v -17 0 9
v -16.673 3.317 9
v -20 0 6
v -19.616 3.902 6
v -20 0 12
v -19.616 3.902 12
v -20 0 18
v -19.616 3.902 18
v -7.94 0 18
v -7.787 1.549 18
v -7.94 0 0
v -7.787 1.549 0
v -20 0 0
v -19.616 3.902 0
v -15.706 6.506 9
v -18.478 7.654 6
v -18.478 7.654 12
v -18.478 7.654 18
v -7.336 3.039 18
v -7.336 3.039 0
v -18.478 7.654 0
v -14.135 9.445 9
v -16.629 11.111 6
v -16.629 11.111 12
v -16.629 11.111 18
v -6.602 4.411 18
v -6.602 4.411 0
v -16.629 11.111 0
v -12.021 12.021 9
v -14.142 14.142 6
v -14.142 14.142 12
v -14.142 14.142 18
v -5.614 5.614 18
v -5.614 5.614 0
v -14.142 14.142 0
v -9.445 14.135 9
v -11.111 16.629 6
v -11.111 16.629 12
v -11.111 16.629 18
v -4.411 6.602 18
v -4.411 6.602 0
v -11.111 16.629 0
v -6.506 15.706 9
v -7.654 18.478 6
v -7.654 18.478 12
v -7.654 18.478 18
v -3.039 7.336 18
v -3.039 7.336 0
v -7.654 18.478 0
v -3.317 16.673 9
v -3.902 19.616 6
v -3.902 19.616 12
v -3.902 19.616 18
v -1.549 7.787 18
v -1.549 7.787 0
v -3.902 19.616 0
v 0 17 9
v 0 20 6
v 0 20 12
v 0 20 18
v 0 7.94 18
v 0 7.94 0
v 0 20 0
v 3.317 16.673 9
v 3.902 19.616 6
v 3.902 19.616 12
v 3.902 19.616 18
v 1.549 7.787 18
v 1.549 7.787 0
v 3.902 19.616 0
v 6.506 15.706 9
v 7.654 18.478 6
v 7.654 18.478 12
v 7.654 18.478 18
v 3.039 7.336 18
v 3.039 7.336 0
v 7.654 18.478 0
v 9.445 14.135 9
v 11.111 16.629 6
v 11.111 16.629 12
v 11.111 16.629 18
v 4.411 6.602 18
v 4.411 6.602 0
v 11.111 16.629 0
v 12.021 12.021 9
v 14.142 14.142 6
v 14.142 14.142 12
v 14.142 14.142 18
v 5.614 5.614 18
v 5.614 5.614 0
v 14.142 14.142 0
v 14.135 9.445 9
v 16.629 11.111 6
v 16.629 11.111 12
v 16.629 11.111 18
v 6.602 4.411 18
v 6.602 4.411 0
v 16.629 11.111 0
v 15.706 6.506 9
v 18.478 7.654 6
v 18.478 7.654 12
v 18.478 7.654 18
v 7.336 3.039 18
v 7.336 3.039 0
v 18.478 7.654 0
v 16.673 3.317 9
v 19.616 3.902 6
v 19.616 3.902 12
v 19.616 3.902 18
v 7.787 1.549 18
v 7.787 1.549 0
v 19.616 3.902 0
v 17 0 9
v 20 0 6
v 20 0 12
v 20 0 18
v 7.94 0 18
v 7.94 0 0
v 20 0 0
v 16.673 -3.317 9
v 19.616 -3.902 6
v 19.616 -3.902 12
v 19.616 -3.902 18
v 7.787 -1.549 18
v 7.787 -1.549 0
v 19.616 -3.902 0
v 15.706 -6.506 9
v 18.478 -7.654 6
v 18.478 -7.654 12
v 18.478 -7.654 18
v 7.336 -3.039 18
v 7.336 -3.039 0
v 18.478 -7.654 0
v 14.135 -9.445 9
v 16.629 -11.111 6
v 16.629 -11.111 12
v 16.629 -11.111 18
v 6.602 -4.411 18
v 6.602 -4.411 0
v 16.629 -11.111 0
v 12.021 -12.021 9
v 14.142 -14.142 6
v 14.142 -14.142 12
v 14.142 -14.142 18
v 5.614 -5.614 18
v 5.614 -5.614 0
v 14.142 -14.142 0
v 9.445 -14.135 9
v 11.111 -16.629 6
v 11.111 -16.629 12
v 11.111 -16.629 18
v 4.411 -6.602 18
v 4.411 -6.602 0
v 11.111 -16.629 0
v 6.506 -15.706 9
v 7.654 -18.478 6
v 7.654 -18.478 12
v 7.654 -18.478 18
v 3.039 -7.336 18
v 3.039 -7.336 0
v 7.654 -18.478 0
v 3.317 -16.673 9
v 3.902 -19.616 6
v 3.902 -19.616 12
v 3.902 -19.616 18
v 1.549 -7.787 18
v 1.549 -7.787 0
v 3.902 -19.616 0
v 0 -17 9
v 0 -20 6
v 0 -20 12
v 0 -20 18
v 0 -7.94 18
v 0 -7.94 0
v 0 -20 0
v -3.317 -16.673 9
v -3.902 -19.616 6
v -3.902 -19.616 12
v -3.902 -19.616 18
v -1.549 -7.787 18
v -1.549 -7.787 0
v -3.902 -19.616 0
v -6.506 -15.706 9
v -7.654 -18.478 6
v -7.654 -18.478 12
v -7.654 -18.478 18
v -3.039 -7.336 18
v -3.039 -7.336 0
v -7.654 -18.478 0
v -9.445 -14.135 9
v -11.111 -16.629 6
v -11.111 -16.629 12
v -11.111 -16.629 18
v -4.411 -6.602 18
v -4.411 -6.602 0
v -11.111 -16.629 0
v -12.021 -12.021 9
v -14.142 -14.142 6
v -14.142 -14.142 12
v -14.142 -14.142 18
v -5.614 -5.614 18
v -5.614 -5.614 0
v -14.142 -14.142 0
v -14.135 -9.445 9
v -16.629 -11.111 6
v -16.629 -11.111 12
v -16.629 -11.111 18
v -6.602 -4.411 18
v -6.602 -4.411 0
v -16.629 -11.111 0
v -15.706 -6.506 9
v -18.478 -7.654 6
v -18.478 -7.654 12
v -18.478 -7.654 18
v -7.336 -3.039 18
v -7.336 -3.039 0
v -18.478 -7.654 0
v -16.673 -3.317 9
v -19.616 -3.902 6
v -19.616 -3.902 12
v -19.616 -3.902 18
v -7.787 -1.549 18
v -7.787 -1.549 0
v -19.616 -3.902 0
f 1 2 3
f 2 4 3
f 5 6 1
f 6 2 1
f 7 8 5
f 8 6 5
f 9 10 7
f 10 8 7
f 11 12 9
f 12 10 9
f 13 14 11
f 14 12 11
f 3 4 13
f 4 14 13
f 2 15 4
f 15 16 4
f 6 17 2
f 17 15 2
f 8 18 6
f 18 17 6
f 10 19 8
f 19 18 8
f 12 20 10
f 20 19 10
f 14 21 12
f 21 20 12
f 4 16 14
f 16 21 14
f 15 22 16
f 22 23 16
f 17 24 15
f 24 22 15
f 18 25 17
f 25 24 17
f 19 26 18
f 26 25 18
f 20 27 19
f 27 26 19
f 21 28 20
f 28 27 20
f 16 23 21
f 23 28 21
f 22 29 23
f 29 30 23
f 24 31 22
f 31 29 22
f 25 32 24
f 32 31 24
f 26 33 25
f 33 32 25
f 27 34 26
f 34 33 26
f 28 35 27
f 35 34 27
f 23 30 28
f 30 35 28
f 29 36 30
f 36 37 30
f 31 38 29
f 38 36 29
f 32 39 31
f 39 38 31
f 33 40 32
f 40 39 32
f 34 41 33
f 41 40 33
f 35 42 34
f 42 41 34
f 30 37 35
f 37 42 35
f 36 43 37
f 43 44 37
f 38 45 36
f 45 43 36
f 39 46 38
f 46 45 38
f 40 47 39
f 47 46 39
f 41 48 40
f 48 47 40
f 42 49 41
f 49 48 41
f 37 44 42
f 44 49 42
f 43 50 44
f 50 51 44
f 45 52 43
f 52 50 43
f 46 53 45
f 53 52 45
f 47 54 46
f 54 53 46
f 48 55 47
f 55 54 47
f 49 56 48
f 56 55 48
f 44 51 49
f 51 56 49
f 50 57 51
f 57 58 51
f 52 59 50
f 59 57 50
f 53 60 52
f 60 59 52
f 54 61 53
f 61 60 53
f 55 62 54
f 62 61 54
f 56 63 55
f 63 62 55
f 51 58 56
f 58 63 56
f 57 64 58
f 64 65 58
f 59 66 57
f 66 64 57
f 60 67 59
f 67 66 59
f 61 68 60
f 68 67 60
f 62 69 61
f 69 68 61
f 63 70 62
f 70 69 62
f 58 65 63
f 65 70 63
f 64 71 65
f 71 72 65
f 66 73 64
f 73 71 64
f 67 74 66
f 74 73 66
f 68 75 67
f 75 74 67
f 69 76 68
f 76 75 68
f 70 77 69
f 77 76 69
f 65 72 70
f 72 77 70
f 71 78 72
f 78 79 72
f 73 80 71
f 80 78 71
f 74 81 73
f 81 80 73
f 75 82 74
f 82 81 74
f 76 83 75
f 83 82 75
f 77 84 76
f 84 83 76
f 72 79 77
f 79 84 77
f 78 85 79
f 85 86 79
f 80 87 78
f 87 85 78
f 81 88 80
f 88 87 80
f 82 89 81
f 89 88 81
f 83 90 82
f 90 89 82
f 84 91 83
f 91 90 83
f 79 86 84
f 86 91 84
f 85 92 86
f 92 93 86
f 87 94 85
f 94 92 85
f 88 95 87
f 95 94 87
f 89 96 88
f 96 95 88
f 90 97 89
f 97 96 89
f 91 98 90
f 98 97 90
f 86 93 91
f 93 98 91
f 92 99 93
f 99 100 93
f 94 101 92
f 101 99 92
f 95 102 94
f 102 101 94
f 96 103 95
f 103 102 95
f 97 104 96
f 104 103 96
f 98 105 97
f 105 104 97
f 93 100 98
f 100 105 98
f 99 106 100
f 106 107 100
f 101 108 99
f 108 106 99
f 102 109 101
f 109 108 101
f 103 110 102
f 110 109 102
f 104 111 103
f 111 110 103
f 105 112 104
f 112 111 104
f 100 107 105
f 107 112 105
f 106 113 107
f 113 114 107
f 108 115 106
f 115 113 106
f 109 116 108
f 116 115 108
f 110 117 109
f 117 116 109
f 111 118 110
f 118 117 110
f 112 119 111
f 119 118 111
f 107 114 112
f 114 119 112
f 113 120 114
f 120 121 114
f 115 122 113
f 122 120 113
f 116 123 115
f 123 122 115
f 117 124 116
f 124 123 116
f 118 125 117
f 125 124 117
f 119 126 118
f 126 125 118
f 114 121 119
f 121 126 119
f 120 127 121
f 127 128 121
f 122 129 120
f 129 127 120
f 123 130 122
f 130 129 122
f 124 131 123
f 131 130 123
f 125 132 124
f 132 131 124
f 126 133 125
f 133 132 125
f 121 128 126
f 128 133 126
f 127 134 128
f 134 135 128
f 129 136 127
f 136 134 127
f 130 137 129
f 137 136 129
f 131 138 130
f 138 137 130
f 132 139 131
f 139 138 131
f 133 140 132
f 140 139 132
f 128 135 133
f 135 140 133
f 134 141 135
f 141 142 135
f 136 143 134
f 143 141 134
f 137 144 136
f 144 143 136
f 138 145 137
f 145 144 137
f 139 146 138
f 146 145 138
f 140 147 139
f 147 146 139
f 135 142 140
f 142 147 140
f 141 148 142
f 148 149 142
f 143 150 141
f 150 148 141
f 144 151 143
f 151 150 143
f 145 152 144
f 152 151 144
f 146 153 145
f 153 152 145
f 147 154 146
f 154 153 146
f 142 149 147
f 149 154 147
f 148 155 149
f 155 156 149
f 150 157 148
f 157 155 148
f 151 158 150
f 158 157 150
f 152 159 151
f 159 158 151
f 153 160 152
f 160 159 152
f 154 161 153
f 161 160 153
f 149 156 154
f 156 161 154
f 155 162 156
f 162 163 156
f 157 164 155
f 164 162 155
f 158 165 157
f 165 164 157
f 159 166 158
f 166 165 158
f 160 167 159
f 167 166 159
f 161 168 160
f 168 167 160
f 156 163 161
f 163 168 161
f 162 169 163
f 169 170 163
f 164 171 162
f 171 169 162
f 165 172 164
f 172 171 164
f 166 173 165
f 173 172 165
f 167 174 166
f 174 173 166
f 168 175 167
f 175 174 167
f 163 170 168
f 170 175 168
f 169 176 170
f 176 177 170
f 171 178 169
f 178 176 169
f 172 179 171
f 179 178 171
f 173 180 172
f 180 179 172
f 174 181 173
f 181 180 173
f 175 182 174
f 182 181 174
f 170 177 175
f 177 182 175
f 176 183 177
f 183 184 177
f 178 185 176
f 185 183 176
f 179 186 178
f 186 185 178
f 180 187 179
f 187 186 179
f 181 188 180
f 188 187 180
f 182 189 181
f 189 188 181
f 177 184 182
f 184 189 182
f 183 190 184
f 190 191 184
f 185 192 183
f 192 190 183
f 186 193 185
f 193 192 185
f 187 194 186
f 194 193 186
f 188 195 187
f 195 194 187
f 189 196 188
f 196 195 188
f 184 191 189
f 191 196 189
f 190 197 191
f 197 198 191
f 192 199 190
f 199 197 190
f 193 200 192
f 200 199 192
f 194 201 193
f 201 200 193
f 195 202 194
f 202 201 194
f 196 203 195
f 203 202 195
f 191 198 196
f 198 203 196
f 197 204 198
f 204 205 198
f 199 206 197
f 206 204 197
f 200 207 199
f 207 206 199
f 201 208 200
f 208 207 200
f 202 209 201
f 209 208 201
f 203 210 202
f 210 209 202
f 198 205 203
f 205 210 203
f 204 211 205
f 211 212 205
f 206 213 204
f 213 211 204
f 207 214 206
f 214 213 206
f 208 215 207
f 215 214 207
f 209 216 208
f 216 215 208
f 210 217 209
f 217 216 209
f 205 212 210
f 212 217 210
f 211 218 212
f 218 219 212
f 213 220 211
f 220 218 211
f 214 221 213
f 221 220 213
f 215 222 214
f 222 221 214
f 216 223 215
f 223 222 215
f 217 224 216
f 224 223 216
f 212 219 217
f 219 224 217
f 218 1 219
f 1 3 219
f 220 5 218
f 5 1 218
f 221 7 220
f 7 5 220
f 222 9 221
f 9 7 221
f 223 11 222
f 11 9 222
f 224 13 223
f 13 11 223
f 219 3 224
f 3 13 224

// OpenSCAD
$fn = 32;

// ----------------------------------------------------------------------
// Belt roller: 40 mm barrel, 18 mm wide, bore 15.88 mm
// ----------------------------------------------------------------------

// --- parameters (mm) ---
bore_d = 15.88;           // bore
barrel_d = 40;            // barrel diameter
roller_w = 18;            // roller width
groove_w = 6;             // guide groove width
groove_d = 3;             // guide groove depth

roller_profile = [[7.94, 0], [20, 0], [20, 6], [17, 9], [20, 12], [20, 18], [7.94, 18]];

/* the profile stays clear of the axis, so the bore comes out of the revolve */
rotate_extrude() polygon(roller_profile);
